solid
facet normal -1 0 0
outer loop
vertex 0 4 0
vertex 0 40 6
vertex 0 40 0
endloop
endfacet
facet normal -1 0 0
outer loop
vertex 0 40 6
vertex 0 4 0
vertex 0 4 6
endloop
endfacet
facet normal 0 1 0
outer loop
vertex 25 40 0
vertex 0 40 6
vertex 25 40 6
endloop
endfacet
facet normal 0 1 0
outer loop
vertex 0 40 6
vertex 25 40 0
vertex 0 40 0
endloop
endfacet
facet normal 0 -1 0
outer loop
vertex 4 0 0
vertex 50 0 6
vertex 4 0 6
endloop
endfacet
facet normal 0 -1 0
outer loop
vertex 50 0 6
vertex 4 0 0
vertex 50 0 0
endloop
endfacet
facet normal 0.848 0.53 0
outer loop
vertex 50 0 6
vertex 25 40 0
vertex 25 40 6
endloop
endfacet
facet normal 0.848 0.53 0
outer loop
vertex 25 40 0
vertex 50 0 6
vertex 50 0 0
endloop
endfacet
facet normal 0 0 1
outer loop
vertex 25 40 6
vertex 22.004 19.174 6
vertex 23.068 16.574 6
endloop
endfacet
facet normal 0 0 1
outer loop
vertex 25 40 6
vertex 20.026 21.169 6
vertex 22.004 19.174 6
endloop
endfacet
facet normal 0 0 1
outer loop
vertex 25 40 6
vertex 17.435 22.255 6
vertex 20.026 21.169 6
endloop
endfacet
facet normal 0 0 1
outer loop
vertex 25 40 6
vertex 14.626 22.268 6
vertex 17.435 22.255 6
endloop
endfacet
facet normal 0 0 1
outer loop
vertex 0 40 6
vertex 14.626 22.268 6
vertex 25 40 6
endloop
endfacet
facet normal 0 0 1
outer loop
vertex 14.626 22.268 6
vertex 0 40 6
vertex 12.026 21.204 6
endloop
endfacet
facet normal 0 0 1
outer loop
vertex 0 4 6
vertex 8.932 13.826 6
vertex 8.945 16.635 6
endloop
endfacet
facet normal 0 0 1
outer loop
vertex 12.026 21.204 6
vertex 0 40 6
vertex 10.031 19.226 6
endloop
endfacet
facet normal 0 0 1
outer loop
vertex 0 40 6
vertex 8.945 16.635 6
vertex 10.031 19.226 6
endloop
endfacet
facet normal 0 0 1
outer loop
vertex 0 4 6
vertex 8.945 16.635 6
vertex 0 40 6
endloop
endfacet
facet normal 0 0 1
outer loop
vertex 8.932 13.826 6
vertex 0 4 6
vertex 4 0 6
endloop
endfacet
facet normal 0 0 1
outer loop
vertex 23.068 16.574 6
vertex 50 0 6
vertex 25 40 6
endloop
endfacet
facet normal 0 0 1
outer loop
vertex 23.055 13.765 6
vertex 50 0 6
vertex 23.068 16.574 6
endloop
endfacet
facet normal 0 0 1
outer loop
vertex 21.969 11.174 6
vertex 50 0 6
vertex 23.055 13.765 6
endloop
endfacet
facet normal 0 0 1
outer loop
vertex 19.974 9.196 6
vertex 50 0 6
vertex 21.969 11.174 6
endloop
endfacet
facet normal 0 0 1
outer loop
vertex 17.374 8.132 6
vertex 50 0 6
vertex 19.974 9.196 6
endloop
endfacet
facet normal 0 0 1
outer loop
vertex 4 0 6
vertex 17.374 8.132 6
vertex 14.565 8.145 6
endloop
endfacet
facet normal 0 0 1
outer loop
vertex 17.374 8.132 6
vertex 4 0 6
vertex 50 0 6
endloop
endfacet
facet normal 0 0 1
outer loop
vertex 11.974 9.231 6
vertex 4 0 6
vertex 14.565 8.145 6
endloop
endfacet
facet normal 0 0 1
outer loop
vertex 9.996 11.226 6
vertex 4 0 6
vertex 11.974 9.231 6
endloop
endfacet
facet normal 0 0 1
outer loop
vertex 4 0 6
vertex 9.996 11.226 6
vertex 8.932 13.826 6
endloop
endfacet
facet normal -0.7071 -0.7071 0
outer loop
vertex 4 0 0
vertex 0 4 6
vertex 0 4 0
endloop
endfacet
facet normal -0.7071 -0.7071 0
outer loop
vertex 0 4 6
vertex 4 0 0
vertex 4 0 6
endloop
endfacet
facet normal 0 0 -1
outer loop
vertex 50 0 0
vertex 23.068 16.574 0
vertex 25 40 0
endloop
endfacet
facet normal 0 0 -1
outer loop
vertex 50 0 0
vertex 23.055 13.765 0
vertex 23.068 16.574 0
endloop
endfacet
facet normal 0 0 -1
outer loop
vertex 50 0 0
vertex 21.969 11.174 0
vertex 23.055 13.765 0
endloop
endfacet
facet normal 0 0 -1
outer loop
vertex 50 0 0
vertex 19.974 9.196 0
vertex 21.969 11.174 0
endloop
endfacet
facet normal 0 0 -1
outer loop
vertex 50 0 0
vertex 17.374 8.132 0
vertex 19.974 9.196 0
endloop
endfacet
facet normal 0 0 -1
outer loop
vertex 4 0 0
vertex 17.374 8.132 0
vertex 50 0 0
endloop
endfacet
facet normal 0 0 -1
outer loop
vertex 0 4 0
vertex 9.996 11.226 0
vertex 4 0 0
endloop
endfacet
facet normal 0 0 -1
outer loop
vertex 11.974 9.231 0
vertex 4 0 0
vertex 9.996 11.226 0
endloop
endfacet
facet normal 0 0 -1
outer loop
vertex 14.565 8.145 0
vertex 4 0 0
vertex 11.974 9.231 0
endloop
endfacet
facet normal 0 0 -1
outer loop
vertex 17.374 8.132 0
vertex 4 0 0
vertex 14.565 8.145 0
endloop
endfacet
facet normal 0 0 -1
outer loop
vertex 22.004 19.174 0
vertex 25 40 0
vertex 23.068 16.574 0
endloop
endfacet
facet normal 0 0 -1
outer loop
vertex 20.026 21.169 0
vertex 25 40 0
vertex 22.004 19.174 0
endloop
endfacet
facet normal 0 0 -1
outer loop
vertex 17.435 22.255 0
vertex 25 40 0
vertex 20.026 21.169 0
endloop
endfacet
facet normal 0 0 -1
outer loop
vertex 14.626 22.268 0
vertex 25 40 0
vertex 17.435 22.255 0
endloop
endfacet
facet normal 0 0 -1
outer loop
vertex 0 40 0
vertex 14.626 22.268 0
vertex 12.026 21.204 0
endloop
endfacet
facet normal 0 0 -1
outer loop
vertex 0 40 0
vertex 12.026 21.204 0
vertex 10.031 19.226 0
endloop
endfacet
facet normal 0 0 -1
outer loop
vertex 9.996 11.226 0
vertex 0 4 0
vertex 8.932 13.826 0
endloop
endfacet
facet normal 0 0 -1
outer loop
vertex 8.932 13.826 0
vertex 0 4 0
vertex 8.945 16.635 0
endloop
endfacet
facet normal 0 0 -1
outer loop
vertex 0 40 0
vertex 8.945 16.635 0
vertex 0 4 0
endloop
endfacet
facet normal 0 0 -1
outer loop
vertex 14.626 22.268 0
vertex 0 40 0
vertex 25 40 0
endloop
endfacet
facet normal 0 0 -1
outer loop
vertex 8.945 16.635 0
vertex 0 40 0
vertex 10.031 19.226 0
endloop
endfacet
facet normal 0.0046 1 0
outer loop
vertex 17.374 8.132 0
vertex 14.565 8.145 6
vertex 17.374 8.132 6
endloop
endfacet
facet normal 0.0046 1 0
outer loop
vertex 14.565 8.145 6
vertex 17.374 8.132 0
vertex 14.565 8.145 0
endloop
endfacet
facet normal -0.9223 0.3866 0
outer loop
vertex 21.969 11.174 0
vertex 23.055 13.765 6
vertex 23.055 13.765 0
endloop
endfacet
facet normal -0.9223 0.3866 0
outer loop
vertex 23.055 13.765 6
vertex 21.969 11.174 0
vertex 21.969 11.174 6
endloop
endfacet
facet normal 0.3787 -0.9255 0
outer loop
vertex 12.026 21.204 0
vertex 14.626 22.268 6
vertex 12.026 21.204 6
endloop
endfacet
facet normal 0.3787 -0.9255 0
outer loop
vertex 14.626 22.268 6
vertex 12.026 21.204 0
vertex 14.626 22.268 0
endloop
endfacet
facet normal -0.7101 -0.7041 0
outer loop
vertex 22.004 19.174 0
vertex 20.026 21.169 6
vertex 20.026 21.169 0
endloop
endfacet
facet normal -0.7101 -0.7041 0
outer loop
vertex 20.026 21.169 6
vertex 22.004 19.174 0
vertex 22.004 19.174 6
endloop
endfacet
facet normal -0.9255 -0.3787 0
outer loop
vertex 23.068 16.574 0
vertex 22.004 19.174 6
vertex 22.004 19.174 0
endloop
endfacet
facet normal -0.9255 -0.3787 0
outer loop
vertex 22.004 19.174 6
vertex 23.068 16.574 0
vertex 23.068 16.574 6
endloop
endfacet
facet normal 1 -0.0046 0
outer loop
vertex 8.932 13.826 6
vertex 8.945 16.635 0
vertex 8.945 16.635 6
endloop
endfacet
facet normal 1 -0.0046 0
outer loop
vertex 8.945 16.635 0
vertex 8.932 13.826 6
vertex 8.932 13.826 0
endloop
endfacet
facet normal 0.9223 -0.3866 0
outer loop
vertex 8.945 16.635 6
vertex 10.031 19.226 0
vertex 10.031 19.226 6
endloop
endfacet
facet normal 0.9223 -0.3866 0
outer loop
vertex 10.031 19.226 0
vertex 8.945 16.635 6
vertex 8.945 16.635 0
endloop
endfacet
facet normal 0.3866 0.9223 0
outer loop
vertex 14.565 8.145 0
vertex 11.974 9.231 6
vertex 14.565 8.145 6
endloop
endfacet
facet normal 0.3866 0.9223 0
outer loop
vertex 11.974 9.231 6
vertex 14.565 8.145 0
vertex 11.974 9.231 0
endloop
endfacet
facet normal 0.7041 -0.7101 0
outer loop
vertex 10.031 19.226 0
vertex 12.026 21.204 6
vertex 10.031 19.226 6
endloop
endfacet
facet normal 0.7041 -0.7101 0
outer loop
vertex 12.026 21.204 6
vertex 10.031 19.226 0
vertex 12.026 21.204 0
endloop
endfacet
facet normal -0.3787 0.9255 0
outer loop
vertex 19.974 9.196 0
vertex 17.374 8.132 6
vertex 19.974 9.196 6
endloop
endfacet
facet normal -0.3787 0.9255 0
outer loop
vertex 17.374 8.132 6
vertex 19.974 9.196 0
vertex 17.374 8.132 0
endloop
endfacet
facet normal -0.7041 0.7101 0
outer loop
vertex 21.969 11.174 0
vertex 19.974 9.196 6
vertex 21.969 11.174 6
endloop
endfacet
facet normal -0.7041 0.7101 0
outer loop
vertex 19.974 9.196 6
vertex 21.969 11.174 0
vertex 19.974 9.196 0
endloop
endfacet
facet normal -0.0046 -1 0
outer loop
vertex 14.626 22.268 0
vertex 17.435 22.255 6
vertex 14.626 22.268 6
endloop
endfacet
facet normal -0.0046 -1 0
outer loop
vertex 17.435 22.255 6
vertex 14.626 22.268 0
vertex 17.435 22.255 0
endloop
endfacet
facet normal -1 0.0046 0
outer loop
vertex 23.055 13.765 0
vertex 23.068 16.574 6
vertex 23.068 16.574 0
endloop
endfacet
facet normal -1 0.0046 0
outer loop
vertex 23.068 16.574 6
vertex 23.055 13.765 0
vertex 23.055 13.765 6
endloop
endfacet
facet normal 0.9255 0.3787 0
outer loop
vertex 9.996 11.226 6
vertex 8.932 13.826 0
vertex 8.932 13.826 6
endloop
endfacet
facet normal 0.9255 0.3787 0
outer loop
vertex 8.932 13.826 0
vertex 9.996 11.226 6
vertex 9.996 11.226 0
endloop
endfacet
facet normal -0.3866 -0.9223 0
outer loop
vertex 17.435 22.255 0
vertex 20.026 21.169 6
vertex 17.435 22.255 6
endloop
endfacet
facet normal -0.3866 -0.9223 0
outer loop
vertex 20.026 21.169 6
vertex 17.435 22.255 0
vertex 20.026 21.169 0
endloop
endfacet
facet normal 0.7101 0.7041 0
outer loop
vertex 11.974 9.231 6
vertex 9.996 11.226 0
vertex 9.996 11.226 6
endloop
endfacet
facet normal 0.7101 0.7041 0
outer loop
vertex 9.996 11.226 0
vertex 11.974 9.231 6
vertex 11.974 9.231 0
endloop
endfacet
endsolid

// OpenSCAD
$fn = 32;

// ----------------------------------------------------------------------
// Bracket plate: gusset 50 x 40
// ----------------------------------------------------------------------

// --- parameters (mm) ---
hole_r = 4;               // bolt hole radius
plate_t = 6;              // plate thickness, Z (extrusion height)
gus_a = 50;               // base length
gus_b = 40;               // height
top_x = 25;               // top edge X of the angled cut
light_r = 7.2;            // lightening hole radius

light_d = 2 * light_r;

profile = [[4, 0], [25, 0], [50, 0], [25, 40], [0, 40], [0, 4]];  // primary outline, 6 points, counter clockwise
void_1 = [[23.068, 16.574], [22.004, 19.174], [20.026, 21.169], [17.435, 22.255], [14.626, 22.268], [12.026, 21.204], [10.031, 19.226], [8.945, 16.635], [8.932, 13.826], [9.996, 11.226], [11.974, 9.231], [14.565, 8.145], [17.374, 8.132], [19.974, 9.196], [21.969, 11.174], [23.055, 13.765]];  // lightening hole, 16 points

// --- the one profile operation ---
difference() {
  linear_extrude(height = plate_t) polygon(points = profile);
  translate([0, 0, -1])
    linear_extrude(height = plate_t + 2) polygon(points = void_1);
}
